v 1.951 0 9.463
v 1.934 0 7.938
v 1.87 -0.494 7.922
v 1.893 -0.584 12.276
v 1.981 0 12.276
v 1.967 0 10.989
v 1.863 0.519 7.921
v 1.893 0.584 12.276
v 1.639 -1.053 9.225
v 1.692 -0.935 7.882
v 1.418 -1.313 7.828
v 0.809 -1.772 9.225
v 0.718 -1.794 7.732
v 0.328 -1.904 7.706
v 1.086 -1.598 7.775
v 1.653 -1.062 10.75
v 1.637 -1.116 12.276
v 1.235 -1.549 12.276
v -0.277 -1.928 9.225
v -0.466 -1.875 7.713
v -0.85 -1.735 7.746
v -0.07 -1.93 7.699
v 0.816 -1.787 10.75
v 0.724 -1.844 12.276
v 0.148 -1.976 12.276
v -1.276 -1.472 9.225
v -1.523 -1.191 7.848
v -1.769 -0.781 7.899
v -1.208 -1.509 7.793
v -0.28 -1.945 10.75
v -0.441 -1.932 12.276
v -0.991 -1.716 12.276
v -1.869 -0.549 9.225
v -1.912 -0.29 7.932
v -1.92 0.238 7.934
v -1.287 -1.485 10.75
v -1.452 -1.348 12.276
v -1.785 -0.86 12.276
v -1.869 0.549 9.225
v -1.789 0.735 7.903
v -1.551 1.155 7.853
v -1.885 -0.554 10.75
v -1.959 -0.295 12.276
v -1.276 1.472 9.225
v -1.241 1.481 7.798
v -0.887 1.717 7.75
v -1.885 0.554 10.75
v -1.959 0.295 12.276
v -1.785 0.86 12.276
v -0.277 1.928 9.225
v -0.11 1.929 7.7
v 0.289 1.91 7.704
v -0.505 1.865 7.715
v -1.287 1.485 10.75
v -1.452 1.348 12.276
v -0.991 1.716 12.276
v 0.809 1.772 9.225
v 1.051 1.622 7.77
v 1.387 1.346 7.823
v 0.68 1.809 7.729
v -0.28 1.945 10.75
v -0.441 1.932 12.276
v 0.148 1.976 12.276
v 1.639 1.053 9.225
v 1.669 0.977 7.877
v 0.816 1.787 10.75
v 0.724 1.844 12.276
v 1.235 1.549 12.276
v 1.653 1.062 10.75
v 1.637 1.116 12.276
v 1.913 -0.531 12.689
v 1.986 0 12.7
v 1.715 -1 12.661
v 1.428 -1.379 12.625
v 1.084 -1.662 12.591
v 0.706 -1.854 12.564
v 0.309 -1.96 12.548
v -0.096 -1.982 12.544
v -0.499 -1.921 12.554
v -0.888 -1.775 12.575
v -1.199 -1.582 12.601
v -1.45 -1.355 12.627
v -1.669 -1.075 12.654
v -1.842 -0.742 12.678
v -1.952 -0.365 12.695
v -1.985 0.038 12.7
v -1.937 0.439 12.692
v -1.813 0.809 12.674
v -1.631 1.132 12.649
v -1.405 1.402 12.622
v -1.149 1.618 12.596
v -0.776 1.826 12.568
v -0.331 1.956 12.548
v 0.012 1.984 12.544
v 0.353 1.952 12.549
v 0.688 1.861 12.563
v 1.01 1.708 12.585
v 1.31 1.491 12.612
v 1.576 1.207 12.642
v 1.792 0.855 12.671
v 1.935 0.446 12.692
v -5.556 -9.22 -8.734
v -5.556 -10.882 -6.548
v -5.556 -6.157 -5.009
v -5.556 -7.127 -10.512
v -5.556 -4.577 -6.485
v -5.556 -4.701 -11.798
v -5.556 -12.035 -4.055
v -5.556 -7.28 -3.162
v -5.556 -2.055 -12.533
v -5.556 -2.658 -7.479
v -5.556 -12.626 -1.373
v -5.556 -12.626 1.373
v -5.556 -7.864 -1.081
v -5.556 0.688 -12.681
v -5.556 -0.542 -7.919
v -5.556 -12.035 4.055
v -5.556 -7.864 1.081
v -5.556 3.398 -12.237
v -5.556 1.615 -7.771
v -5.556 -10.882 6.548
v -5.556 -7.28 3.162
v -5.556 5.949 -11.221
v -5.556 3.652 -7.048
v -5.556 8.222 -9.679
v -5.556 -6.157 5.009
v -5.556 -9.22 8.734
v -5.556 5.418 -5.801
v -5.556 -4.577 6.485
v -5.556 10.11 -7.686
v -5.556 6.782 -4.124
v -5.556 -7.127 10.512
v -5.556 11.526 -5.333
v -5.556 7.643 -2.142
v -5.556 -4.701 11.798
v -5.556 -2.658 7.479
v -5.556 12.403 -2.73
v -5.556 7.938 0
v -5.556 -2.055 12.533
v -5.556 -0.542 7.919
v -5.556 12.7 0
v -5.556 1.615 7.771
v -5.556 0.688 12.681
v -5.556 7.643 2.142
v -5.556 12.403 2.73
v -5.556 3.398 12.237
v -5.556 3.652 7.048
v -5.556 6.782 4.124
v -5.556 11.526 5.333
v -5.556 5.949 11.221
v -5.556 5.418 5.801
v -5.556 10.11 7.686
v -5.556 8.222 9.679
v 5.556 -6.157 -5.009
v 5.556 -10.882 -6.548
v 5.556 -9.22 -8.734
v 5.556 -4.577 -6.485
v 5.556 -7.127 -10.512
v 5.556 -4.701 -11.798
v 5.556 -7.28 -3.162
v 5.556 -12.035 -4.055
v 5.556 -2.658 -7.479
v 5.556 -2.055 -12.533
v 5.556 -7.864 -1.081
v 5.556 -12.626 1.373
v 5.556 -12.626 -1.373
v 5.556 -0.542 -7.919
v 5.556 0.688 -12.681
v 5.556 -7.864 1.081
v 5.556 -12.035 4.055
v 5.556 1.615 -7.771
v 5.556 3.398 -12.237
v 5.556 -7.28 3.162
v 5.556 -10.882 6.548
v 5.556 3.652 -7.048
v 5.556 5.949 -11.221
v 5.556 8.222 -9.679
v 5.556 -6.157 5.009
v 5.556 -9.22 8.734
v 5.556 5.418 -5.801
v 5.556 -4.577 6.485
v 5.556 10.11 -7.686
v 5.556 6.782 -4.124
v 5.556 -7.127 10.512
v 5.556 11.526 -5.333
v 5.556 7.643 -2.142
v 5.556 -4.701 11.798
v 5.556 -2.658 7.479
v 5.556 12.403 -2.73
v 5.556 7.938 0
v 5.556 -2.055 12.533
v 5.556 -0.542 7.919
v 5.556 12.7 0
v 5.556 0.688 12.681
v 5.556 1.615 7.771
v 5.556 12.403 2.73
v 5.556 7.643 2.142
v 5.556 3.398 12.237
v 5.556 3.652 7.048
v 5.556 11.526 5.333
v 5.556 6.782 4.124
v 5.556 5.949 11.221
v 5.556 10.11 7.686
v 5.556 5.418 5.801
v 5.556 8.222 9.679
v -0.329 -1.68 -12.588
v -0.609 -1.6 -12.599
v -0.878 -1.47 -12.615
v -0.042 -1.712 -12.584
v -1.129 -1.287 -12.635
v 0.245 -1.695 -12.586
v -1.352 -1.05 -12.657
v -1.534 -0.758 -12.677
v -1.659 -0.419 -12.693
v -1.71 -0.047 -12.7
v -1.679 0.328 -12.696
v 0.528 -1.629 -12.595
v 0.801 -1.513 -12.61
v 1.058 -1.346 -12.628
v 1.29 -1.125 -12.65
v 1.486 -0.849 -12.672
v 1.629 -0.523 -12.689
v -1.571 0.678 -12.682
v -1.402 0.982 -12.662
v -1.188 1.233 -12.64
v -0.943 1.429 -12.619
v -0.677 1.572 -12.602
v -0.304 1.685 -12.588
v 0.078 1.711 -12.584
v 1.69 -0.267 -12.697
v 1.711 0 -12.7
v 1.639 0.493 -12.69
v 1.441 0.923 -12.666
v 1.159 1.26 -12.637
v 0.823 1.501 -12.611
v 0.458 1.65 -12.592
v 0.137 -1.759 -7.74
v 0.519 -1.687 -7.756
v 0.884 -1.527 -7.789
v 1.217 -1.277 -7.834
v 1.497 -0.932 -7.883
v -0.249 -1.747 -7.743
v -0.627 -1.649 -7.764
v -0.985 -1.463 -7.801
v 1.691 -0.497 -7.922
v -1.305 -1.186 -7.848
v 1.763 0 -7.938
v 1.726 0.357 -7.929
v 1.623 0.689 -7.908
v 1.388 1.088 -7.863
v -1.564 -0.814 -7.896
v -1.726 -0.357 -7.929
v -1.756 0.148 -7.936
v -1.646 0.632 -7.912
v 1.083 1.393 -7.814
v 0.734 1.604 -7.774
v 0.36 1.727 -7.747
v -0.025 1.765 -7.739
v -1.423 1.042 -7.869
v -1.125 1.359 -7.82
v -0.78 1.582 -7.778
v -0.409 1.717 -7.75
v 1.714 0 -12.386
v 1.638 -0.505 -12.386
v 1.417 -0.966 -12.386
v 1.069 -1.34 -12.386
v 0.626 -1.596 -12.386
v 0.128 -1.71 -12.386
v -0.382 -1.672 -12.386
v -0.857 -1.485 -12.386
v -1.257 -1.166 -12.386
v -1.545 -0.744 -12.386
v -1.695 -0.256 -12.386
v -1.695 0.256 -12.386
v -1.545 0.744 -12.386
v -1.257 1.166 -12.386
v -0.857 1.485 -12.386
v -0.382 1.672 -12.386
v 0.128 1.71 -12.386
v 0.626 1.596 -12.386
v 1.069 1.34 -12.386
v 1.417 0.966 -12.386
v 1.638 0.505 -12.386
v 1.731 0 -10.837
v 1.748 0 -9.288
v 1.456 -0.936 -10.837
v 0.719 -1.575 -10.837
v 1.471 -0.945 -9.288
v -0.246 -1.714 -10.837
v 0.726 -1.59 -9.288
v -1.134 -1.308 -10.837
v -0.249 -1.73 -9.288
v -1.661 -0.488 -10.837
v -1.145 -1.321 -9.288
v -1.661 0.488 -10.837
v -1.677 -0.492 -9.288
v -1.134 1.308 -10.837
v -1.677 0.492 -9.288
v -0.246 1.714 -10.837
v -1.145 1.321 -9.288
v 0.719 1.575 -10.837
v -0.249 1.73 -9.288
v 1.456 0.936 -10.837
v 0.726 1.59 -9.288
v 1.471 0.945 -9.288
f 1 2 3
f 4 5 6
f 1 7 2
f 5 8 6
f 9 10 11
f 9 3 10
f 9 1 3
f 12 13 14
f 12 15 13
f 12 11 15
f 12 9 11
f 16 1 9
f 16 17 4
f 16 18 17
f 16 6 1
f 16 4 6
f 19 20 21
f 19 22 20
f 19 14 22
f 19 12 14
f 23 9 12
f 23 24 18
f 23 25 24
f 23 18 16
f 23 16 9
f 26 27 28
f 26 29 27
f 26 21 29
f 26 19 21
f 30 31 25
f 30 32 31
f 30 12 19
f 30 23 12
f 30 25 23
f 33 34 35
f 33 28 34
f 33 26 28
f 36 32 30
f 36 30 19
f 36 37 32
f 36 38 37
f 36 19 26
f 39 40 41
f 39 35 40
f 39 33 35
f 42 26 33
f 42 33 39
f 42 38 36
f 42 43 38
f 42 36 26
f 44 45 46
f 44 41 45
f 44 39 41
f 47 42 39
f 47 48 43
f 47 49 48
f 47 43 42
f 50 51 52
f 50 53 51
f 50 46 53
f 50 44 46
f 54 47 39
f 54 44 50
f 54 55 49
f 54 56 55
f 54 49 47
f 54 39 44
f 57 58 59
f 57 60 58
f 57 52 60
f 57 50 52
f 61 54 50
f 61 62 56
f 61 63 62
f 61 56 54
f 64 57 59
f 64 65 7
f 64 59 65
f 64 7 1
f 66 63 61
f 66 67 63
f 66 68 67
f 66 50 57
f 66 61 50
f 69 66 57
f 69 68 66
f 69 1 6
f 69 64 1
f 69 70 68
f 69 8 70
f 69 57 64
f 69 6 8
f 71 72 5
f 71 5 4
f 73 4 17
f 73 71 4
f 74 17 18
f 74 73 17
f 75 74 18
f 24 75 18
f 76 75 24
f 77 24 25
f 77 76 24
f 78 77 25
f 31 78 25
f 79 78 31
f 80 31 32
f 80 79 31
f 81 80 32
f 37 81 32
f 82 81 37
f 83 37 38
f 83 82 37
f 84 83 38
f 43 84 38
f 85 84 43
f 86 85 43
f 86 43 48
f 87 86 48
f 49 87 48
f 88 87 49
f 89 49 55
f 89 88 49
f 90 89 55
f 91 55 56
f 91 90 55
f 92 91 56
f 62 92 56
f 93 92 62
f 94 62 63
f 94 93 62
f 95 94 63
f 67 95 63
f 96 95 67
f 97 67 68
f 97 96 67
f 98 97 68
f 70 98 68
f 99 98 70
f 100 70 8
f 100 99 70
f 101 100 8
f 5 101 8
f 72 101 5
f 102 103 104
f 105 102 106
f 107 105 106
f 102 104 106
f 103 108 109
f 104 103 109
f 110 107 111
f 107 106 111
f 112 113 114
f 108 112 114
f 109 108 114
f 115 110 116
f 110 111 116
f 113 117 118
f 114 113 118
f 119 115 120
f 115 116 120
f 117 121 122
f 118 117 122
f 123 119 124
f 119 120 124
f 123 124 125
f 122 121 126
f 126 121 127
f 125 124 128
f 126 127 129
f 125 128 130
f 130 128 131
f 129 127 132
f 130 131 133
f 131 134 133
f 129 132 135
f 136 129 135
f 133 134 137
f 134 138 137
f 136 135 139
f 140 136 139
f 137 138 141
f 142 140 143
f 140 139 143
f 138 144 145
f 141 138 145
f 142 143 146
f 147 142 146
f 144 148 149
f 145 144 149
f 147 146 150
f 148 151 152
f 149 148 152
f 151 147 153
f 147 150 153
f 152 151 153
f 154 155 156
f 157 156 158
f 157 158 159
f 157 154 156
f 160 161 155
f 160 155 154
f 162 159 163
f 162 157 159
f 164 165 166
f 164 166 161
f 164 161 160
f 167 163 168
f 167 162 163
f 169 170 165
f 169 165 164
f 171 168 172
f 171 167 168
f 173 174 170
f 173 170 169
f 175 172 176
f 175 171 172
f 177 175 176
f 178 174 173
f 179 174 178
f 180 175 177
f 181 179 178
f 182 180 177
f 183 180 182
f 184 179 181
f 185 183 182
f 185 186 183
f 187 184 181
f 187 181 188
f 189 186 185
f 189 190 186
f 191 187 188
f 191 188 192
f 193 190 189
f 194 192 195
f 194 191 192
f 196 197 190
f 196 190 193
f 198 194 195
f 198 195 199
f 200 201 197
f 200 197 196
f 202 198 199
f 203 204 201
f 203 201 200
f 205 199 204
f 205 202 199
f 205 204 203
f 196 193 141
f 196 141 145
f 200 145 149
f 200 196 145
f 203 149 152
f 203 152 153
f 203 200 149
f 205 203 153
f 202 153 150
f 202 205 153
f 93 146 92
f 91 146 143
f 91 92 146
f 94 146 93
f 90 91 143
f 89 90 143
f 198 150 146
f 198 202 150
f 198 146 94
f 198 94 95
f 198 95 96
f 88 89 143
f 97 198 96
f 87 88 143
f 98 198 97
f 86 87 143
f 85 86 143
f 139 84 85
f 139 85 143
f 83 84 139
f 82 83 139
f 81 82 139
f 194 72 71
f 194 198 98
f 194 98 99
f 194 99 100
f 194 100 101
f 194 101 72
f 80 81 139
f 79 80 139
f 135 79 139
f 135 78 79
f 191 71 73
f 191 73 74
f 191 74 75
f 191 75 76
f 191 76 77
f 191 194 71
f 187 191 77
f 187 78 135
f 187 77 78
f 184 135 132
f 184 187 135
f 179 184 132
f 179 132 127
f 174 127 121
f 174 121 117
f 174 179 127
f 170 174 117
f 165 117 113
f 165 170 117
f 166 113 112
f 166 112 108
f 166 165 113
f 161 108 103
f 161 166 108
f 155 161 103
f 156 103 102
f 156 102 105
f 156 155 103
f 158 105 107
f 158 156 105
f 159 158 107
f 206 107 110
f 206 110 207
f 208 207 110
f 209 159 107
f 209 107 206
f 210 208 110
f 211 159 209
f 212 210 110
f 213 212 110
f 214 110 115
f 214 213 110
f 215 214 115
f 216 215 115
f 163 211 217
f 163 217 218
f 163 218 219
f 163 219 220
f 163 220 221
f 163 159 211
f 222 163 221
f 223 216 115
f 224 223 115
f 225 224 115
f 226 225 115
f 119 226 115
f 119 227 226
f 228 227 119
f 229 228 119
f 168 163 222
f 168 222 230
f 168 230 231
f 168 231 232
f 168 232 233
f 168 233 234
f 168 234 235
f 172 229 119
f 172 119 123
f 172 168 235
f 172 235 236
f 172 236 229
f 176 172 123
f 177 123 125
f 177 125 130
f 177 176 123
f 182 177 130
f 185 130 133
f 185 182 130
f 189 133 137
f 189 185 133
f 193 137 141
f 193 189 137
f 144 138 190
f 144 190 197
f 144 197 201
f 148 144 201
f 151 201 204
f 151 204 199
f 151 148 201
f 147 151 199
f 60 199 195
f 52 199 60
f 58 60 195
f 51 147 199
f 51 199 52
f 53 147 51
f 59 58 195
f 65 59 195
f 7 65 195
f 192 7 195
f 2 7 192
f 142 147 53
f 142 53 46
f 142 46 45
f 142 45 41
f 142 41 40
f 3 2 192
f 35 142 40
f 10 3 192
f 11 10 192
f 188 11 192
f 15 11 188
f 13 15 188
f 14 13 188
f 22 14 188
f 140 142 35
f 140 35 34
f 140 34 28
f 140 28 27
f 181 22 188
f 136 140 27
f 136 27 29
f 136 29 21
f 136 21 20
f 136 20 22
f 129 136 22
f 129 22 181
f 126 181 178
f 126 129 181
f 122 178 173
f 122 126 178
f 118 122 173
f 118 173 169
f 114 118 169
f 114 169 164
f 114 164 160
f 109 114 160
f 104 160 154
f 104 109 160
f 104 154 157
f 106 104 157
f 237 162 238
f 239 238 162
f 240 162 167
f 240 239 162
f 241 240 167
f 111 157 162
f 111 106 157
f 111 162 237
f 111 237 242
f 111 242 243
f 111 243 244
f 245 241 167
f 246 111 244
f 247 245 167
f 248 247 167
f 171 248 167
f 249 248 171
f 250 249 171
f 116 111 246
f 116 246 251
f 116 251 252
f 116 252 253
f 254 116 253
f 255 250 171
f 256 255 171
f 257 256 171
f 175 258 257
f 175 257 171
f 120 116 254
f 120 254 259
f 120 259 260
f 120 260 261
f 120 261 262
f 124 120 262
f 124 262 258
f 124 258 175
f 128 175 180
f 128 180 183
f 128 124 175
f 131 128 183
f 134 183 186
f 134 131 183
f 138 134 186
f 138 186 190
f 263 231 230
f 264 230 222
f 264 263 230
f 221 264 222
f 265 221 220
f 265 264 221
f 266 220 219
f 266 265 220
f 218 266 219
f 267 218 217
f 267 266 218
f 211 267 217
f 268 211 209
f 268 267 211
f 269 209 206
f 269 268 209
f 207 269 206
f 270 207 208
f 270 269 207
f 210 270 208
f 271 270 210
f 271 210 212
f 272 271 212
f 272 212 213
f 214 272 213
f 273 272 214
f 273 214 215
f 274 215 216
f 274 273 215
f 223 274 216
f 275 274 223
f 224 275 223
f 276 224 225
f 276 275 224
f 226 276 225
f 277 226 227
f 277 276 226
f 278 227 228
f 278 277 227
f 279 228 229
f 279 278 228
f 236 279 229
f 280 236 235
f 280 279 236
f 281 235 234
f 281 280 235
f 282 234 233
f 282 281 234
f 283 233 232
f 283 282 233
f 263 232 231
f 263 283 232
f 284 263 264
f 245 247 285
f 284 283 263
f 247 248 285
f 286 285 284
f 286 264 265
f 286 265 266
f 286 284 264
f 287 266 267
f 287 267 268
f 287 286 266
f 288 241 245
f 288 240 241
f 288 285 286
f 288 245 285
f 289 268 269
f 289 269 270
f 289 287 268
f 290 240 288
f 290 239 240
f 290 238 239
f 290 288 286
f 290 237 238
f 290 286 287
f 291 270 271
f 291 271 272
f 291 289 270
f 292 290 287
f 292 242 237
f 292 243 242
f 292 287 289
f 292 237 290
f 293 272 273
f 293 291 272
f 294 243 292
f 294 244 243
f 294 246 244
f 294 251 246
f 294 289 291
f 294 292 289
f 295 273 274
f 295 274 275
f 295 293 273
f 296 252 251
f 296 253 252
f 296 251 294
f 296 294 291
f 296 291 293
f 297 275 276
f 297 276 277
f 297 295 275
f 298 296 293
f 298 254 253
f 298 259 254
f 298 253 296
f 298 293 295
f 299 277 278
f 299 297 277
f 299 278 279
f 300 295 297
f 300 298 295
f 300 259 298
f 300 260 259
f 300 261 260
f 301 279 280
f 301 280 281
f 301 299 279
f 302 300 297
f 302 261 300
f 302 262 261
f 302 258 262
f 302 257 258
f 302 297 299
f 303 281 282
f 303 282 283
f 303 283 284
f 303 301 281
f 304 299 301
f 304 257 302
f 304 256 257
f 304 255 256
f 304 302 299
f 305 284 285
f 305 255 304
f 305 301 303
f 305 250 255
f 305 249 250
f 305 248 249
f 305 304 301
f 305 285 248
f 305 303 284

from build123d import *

# Parameters (mm, degrees)
F2_R     = 12.7
F2_R_2   = 7.9375
F0_DEPTH = 5.55625


with BuildPart() as f0:
    # F2 (on Right) → F0 (new body, symmetric)
    with BuildSketch(Plane.YZ):
        Circle(F2_R)
        Circle(F2_R_2, mode=Mode.SUBTRACT)
    extrude(amount=F0_DEPTH, both=True)

    # F1 (on Front) → F3 (revolve, cut)
    with BuildSketch(Plane.XZ):
        Polygon((1.7145, -12.386102), (1.9812, 12.275856), (1.985787, 12.7), (0, 12.7), (0, -12.7), (1.711105, -12.7), align=None)
    revolve(axis=Axis((0, 0, 0), (0, 0, -1)), mode=Mode.SUBTRACT)


solid = f0.part
